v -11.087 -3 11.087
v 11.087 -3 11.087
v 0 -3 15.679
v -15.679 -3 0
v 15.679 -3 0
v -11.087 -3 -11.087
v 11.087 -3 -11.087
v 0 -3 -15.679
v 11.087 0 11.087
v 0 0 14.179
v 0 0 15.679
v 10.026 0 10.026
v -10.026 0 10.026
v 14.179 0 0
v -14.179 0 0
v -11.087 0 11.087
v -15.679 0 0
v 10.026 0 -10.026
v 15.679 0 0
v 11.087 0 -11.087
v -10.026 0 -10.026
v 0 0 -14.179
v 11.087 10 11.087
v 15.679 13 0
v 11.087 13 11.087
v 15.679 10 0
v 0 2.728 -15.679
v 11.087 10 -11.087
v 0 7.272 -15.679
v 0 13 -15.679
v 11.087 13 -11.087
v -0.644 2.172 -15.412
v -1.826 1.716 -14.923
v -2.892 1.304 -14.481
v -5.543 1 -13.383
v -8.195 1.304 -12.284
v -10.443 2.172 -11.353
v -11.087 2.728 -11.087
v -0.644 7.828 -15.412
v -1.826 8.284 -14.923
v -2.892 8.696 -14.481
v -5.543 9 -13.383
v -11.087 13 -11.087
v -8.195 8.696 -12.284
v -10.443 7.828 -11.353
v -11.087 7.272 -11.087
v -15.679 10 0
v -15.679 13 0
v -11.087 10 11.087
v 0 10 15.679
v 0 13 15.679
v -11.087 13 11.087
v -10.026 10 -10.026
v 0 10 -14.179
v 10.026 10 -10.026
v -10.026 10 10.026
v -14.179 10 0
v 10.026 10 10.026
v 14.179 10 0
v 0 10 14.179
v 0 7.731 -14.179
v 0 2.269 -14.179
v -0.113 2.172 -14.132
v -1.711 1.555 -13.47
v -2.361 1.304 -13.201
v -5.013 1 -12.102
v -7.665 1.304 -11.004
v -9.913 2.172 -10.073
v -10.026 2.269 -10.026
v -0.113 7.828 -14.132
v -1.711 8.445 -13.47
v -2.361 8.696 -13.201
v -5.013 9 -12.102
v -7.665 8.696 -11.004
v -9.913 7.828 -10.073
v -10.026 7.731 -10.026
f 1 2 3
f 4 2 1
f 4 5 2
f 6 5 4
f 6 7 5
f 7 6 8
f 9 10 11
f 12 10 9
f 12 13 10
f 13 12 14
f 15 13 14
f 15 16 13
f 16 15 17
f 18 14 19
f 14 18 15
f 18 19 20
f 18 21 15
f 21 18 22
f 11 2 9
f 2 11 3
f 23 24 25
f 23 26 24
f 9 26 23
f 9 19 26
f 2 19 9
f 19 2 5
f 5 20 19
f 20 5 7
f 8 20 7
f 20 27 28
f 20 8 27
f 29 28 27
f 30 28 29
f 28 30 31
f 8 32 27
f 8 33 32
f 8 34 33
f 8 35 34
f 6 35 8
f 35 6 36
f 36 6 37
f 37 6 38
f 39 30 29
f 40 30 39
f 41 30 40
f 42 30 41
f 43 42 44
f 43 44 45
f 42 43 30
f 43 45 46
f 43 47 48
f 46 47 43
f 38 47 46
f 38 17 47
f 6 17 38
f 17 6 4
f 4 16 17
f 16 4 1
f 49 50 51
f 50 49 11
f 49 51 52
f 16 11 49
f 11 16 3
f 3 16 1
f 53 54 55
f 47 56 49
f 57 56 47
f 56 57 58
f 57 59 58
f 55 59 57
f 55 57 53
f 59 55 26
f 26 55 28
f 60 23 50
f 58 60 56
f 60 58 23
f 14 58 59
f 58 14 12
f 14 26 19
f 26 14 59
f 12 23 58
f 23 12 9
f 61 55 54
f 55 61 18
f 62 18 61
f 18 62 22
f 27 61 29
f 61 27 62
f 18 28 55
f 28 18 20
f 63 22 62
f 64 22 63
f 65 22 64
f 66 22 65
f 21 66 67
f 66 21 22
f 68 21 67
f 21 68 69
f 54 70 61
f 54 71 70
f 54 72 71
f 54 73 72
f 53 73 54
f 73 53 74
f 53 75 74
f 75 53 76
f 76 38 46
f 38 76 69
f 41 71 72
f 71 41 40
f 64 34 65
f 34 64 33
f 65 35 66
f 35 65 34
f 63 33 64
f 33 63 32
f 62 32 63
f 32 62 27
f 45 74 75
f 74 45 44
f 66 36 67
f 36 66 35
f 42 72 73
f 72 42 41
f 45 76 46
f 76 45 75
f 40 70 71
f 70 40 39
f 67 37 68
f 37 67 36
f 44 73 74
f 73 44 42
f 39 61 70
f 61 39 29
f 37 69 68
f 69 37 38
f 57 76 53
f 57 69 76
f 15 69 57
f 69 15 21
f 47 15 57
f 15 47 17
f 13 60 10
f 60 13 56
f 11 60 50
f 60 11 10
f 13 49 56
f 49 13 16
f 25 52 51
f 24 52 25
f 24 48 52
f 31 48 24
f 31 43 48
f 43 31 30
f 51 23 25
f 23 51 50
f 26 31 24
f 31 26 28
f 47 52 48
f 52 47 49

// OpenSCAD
//
//
//

inner_radius = 24;
outer_radius = 36;
tower_height = 20;
thickness = 3;

walkway_length = 8;

third_floor_slice_count = 8; // this indirectly controls the size of the pad
third_floor_slice_sweep = 360 / third_floor_slice_count;

width = outer_radius - inner_radius;
third_floor_radius = (width / 2) / sin(third_floor_slice_sweep / 2);
third_floor_edge_radius = cos(third_floor_slice_sweep / 2) * third_floor_radius;

wall_thickness = 1.5;
wall_height = 10;


module make_third_floor() {
    union() {
        for (rotational_index=[0:1:third_floor_slice_count-1]) {
            start_angle = (360.0 / third_floor_slice_count) * rotational_index;
            end_angle = (360.0 / third_floor_slice_count) * (rotational_index + 1);

            p03x = 0;
            p03y = 0 - thickness;
            p03z = 0;

            p12x = 0;
            p12y = 0;
            p12z = 0;

            p4x = third_floor_radius * sin(start_angle);
            p4y = 0 - thickness;
            p4z = third_floor_radius * cos(start_angle);

            p5x = third_floor_radius * sin(start_angle);
            p5y = 0;
            p5z = third_floor_radius * cos(start_angle);

            p6x = third_floor_radius * sin(end_angle);
            p6y = 0;
            p6z = third_floor_radius * cos(end_angle);

            p7x = third_floor_radius * sin(end_angle);
            p7y =  0 - thickness;
            p7z = third_floor_radius * cos(end_angle);

            section_points = [[p03x, p03y, p03z], // 0
                              [p12x, p12y, p12z], // 1
                              [p4x, p4y, p4z], // 2
                              [p5x, p5y, p5z], // 3
                              [p6x, p6y, p6z], // 4
                              [p7x, p7y, p7z]]; // 5
            polyhedron(points=section_points,
                       faces=[[0, 5, 2], // bottom
                              [1, 3, 4], // top
                              [2, 5, 4, 3], // outside
                              [0, 2, 3, 1], // hidden face
                              [0, 1, 4, 5] // hidden face
                           ]);
        }
    }
}

module make_wall(rotational_index, window) {
    start_angle = (360.0 / third_floor_slice_count) * rotational_index;
    end_angle = (360.0 / third_floor_slice_count) * (rotational_index + 1);
    mid_angle = (start_angle + end_angle) / 2;

    if (rotational_index == 1 ||
        rotational_index == 3 ||
        rotational_index == 4 ||
        rotational_index == 5 ||
        rotational_index == 7) {
        difference() {
            union() {
                p5x = third_floor_radius * sin(start_angle);
                p5y = 0;
                p5z = third_floor_radius * cos(start_angle);

                p6x = third_floor_radius * sin(end_angle);
                p6y = 0;
                p6z = third_floor_radius * cos(end_angle);

                p8x = (third_floor_radius - wall_thickness) * sin(start_angle);
                p8y = 0;
                p8z = (third_floor_radius - wall_thickness) * cos(start_angle);

                p9x = (third_floor_radius - wall_thickness) * sin(end_angle);
                p9y = 0;
                p9z = (third_floor_radius - wall_thickness) * cos(end_angle);

                p10x = p6x;
                p10y = p6y + wall_height;
                p10z = p6z;

                p11x = p8x;
                p11y = p8y + wall_height;
                p11z = p8z;

                p12x = p9x;
                p12y = p9y + wall_height;
                p12z = p9z;

                p13x = p5x;
                p13y = p5y + wall_height;
                p13z = p5z;

                wall_points = [[p5x, p5y, p5z], // 0
                               [p6x, p6y, p6z], // 1
                               [p8x, p8y, p8z], // 2
                               [p9x, p9y, p9z], // 3
                               [p10x, p10y, p10z], // 4
                               [p11x, p11y, p11z], // 5
                               [p12x, p12y, p12z], // 6
                               [p13x, p13y, p13z]]; // 7

                polyhedron(points=wall_points,
                           faces=[[2, 3, 1, 0], // bottom
                                  [4, 6, 5, 7], // top
                                  [0, 1, 4, 7], // outside
                                  [2, 5, 6, 3], // inside
                                  [6, 4, 1, 3], // left
                                  [2, 0, 7, 5] // right
                               ]);
            }

            union() {
                if (rotational_index == 4 && window) {
                    rotate([0, mid_angle, 0]) {
                        translate([0, wall_height / 2, third_floor_radius - 1]) {
                            scale([1.5, 0.8, 1]) {
                                cylinder(h = wall_thickness*5, r1 = wall_height/2, r2 = wall_height/2, center = true, $fn=16);
                            }
                        }
                    }
                }
            }
        }
    }
}


nth = 0;  // this is overridden by Makefile

if (nth == 0 || nth == 1) {
    make_third_floor();
}

if (nth == 0) {
    union() {
        for (rotational_index=[0:1:third_floor_slice_count-1]) {
            make_wall(rotational_index, true);
        }
    }
} else if (nth >= 2 && nth <= 9) {
    make_wall(nth - 2, false);
}

if (nth == 0 || nth == 10) {
    translate([0, wall_height + thickness, 0]) {
        make_third_floor();
    }
}
